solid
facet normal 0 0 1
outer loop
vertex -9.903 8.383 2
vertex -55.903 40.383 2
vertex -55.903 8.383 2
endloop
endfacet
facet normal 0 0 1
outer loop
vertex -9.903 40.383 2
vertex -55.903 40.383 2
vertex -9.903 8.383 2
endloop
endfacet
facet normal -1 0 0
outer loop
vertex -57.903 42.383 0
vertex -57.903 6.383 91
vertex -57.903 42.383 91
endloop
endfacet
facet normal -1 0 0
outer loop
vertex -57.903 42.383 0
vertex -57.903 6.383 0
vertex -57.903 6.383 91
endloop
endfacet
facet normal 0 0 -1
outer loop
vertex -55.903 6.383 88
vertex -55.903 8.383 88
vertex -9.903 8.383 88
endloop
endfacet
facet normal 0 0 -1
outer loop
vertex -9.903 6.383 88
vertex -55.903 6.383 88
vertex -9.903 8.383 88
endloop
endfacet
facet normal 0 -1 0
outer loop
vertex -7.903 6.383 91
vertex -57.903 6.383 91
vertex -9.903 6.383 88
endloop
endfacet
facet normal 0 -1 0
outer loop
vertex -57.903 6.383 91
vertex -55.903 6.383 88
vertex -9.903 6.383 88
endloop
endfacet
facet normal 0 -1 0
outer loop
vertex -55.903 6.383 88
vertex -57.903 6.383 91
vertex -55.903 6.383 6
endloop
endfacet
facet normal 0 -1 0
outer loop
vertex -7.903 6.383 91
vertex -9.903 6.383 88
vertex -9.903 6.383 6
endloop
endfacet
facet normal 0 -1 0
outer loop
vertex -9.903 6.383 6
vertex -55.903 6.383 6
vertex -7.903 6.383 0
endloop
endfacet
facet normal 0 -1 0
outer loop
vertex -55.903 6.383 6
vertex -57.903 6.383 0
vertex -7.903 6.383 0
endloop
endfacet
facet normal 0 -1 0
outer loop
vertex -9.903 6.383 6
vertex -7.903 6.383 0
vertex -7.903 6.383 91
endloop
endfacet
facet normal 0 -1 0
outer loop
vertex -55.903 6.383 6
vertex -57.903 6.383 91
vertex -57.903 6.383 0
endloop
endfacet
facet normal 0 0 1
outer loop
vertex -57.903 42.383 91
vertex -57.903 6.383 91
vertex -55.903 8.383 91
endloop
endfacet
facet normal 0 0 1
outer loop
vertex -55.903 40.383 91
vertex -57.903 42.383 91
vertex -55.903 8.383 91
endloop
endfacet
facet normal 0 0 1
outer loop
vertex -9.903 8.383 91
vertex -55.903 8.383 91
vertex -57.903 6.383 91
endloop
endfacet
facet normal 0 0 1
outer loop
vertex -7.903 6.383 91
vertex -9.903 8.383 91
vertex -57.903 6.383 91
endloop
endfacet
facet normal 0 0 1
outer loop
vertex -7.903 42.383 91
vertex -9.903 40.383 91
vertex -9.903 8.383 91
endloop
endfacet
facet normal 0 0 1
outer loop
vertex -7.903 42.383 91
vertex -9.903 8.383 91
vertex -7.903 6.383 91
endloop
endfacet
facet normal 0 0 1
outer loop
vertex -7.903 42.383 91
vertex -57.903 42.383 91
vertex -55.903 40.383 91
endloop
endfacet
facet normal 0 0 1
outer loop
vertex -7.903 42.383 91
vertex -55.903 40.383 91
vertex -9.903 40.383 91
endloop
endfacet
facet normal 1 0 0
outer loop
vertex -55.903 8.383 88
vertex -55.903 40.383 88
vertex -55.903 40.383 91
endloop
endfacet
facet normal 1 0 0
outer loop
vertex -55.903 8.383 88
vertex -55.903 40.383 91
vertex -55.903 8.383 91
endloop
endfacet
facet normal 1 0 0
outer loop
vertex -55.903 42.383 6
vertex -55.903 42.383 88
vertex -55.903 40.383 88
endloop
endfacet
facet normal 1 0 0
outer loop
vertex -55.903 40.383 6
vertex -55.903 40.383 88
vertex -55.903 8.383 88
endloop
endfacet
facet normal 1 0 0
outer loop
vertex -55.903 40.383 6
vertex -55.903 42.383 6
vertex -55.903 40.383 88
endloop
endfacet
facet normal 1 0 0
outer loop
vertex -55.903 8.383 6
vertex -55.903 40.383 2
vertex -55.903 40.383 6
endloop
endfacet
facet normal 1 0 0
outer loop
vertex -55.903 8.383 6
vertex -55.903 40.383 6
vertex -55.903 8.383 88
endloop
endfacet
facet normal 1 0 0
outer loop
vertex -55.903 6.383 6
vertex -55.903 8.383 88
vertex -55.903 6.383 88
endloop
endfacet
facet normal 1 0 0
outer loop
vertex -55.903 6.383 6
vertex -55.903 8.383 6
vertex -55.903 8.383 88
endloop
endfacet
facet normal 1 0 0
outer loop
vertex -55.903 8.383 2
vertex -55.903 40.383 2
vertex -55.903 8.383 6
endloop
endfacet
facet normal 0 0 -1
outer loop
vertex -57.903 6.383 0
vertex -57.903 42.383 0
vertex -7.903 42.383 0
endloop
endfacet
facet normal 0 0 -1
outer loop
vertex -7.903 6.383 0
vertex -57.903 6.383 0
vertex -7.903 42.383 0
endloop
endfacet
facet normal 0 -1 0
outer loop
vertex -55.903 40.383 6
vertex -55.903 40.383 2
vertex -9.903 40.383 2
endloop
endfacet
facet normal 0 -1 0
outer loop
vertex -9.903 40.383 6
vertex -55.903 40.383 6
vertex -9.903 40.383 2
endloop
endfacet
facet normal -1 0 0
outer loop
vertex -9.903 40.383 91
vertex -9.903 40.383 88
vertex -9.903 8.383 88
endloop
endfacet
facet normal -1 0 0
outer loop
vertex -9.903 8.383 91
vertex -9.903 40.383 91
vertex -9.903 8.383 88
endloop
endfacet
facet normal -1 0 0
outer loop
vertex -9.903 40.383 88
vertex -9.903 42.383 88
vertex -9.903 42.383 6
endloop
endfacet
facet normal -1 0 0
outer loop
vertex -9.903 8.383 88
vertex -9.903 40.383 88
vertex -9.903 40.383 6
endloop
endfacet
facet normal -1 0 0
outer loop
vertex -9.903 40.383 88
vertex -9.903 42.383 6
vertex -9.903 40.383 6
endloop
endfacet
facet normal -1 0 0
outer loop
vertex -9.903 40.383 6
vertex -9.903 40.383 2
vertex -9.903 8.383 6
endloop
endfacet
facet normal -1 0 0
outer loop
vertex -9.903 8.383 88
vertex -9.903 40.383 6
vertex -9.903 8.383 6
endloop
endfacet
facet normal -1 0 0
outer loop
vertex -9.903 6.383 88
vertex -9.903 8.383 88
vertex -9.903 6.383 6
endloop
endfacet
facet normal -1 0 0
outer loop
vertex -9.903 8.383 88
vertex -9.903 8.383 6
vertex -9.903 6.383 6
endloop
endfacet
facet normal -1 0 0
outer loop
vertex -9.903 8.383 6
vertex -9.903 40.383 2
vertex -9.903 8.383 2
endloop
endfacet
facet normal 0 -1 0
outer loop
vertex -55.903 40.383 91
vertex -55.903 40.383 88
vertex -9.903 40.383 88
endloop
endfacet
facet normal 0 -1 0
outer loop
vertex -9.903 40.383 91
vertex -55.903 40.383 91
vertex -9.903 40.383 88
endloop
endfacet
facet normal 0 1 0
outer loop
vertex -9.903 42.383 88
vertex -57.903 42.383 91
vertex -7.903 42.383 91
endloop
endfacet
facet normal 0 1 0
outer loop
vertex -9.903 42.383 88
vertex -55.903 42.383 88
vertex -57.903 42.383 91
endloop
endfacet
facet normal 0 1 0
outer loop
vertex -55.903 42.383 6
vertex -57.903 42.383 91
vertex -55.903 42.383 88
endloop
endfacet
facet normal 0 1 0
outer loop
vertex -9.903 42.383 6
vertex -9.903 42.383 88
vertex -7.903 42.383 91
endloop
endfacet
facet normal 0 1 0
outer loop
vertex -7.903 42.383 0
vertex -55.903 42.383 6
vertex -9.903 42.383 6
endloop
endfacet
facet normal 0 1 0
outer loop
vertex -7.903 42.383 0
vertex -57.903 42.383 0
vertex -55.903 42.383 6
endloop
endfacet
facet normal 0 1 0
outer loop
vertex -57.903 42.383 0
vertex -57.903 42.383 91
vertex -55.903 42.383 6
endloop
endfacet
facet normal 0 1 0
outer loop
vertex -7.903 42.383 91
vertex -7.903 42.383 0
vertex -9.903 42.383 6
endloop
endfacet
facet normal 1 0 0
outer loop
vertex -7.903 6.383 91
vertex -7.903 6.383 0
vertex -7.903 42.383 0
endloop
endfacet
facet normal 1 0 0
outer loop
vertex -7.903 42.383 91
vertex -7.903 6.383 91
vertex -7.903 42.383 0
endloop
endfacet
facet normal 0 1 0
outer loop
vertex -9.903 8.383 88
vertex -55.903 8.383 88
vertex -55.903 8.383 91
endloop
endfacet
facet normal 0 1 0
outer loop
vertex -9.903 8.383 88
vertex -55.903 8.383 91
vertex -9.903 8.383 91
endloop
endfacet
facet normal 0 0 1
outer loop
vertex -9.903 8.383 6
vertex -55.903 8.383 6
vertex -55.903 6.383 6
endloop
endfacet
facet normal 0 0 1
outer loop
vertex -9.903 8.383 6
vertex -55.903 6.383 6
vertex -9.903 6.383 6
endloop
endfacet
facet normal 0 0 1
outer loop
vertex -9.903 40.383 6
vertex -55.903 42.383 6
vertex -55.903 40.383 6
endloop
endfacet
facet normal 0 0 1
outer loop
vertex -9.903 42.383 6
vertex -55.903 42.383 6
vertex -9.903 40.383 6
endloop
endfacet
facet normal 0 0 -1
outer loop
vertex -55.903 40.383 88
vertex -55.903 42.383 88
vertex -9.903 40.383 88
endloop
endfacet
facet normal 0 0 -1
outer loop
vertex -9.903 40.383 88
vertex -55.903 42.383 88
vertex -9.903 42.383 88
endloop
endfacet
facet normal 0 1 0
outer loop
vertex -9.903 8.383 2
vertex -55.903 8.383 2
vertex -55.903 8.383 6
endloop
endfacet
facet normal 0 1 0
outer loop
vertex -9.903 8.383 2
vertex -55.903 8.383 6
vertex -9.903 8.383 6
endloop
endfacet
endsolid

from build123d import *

# Parameters (mm, degrees)
F0_W     = 50
F0_H     = 36
F1_DEPTH = 2
F2_W     = 50
F2_H     = 36
F2_W_2   = 46
F2_H_2   = 32
F3_DEPTH = 4
F4_W     = 2
F4_H     = 36
F5_DEPTH = 85
F6_W     = 50
F6_H     = 36
F7_DEPTH = 3
F8_W     = 46
F8_H     = 32
F9_DEPTH = 25


with BuildPart() as f1:
    # F0 (on Top) → F1 (new body)
    with BuildSketch(Plane.XY):
        with Locations((-32.9025480896, 24.3834912755)):
            Rectangle(F0_W, F0_H)
    extrude(amount=F1_DEPTH)

    # F2 (on face) → F3 (join)
    with BuildSketch(Plane.XY.offset(2)):
        with Locations((-32.9025480896, 24.3834912755)):
            Rectangle(F2_W, F2_H)
        with Locations((-32.9025480896, 24.3834912755)):
            Rectangle(F2_W_2, F2_H_2, mode=Mode.SUBTRACT)
    extrude(amount=F3_DEPTH)

    # F4 (on face) → F5 (join)
    with BuildSketch(Plane.XY.offset(6)):
        with Locations((-56.9025480896, 24.3834912755)):
            Rectangle(F4_W, F4_H)
        with Locations((-8.9025480896, 24.3834912755)):
            Rectangle(F4_W, F4_H)
    extrude(amount=F5_DEPTH)

    # F6 (on face) → F7 (join)
    with BuildSketch(Plane.XY.offset(91)):
        with Locations((-32.9025480896, 24.3834912755)):
            Rectangle(F6_W, F6_H)
    extrude(amount=-F7_DEPTH)

    # F8 (on face) → F9 (cut)
    with BuildSketch(Plane(origin=(0, 0, 88), x_dir=(1, 0, 0), z_dir=(0, 0, -1))):
        with Locations((-32.9025480896, -24.3834912755)):
            Rectangle(F8_W, F8_H)
    extrude(amount=-F9_DEPTH, mode=Mode.SUBTRACT)


solid = f1.part
